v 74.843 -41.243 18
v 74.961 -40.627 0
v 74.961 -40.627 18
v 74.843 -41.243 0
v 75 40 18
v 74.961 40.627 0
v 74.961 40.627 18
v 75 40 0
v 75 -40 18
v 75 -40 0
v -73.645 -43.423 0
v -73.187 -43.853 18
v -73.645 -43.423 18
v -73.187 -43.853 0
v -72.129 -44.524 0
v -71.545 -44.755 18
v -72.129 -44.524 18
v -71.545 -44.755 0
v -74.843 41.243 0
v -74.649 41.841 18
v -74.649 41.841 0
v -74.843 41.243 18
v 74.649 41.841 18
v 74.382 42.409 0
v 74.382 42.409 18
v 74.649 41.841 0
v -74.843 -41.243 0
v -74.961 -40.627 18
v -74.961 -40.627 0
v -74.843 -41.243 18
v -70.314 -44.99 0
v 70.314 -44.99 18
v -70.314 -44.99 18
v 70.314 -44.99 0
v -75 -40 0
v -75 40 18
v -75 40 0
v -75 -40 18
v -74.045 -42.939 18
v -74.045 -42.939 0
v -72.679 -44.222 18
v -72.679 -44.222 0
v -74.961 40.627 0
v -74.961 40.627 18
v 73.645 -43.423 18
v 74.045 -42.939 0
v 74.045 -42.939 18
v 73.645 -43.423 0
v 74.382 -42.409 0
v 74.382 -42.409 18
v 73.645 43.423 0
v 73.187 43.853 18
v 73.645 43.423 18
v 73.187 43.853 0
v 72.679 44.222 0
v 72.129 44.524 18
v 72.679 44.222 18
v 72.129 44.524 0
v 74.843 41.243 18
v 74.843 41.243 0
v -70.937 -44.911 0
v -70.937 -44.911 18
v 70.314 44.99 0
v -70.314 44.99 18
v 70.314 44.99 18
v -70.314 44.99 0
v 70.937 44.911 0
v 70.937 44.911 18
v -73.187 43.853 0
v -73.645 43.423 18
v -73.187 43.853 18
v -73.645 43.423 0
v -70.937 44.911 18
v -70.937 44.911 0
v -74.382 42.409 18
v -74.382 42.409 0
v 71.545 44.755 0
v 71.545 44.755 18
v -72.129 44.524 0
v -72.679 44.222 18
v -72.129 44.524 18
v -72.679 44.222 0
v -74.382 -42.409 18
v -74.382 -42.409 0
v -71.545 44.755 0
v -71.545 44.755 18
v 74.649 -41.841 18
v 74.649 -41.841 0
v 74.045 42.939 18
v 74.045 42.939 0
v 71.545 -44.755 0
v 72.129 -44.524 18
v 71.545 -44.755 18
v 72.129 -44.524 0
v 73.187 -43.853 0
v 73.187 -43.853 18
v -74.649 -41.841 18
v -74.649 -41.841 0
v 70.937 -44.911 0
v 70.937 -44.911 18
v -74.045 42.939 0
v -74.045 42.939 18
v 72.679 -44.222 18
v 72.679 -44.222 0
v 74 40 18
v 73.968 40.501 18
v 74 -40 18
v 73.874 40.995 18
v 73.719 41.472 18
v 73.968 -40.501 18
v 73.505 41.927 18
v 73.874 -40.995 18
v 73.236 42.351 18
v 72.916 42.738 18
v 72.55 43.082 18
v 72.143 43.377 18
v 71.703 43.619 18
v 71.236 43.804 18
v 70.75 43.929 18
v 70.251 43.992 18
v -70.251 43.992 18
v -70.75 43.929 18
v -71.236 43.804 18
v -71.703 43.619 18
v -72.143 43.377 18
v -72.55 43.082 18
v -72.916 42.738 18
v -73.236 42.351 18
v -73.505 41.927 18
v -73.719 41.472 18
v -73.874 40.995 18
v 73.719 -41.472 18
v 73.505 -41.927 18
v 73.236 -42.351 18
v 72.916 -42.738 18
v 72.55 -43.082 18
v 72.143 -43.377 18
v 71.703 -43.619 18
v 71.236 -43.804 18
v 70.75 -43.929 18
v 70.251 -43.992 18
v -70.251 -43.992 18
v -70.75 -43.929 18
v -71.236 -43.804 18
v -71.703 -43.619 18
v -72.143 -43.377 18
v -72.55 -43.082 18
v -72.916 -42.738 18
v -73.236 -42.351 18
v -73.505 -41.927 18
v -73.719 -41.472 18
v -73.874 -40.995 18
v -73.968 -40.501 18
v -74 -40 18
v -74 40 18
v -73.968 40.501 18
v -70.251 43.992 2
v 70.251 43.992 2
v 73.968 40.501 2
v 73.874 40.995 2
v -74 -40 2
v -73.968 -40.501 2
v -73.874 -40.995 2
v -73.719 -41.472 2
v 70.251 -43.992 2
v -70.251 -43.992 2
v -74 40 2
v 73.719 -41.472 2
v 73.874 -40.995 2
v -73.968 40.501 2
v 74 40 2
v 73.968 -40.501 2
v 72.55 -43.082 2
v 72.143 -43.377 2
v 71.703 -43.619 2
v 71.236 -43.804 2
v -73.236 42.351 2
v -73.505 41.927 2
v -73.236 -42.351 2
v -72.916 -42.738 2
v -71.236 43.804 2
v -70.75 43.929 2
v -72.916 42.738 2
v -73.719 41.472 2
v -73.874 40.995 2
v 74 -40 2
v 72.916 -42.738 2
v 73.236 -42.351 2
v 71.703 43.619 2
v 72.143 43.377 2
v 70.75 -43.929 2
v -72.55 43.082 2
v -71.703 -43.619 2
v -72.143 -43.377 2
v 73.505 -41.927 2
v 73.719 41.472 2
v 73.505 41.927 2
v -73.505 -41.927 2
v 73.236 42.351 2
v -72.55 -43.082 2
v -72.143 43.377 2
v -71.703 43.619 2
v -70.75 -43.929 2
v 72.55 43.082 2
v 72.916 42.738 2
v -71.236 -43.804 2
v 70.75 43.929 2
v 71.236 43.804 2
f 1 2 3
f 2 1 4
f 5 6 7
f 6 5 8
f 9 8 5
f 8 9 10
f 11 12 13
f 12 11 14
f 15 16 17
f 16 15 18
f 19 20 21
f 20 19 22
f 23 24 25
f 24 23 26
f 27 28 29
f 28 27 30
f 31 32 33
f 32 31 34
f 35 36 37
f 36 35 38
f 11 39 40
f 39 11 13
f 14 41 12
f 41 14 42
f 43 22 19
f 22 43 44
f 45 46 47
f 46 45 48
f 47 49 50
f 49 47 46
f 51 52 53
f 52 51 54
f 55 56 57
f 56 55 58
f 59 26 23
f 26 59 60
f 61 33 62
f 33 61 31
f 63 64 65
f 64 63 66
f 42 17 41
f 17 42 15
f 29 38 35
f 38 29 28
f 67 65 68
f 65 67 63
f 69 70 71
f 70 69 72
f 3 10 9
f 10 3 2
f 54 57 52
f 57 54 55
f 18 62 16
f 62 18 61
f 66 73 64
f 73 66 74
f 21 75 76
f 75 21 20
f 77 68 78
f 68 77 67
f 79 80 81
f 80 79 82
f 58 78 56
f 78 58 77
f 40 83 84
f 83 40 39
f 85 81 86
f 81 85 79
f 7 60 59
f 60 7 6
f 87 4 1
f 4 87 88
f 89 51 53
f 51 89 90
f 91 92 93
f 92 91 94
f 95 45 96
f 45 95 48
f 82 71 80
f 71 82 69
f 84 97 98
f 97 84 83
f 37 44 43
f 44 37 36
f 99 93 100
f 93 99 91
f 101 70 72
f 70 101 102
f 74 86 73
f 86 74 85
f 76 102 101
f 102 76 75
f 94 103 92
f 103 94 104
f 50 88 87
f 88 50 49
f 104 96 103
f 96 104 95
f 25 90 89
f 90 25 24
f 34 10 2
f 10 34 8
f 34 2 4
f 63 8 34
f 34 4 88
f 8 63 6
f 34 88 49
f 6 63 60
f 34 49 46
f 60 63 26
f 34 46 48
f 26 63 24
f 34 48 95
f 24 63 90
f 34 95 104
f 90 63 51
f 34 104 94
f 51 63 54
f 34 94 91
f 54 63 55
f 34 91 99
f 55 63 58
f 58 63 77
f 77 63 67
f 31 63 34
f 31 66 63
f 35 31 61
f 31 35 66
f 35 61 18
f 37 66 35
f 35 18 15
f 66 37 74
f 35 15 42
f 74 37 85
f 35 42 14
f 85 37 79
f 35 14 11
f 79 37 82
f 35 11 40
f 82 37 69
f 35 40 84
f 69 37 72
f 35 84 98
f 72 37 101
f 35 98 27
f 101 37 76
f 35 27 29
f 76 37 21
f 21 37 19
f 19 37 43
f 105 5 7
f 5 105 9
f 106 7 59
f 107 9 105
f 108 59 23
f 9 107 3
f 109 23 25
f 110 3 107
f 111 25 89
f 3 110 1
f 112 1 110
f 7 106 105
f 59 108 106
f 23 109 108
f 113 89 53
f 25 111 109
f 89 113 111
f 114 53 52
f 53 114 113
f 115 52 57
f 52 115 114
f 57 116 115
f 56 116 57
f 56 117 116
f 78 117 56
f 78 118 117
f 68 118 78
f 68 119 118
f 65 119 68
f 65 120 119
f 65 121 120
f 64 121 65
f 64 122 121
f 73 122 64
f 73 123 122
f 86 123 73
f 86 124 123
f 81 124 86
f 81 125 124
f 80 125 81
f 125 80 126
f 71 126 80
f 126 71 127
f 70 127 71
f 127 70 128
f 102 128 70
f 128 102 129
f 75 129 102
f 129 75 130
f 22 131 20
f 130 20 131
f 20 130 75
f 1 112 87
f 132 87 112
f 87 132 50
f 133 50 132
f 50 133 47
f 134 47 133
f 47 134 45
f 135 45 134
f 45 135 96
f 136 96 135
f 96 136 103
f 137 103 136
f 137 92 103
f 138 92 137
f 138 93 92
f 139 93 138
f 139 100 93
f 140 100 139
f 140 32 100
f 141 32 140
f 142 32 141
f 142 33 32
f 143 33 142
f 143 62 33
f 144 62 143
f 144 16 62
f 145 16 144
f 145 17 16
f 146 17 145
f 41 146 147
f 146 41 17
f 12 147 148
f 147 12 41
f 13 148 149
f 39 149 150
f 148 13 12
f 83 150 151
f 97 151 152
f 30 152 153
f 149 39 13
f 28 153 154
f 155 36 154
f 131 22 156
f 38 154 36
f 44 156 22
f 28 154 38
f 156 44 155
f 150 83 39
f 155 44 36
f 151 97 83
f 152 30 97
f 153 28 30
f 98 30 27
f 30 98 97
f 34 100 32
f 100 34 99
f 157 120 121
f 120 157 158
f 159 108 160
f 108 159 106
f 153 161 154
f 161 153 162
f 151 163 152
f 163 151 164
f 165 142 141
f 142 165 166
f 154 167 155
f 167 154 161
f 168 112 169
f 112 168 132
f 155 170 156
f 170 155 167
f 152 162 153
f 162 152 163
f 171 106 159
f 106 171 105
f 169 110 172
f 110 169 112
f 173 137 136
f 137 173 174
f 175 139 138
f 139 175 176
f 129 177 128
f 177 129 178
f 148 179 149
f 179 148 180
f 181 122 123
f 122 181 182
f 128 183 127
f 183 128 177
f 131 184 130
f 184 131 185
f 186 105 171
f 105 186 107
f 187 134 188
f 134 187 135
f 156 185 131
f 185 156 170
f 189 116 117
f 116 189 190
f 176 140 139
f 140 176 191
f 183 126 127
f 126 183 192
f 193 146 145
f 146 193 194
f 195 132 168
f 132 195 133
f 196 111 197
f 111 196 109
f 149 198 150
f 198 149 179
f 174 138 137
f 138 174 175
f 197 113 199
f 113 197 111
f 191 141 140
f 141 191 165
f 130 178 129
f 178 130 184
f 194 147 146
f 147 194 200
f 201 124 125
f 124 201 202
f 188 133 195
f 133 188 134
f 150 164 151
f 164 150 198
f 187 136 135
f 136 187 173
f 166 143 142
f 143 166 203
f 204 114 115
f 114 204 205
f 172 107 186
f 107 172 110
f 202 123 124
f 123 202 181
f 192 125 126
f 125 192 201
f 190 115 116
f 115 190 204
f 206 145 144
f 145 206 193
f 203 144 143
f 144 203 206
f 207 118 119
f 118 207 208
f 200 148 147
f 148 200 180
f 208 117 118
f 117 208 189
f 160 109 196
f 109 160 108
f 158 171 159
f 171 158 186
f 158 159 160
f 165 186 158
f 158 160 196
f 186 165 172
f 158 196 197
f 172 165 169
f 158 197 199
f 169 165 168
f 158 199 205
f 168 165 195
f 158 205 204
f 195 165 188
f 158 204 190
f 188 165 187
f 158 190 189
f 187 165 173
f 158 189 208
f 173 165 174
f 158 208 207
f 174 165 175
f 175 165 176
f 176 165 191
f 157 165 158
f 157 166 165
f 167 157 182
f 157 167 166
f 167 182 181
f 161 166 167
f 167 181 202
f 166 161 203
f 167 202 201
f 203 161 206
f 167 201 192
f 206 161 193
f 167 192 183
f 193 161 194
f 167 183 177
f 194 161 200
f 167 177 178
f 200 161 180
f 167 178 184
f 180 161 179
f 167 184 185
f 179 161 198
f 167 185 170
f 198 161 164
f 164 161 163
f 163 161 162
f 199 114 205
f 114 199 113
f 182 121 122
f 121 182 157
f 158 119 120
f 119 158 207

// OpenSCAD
$fn = 50;


difference() {
	union() {
		hull() {
			translate(v = [-70.0000000000, 40.0000000000, 0]) {
				cylinder(h = 18, r = 5);
			}
			translate(v = [70.0000000000, 40.0000000000, 0]) {
				cylinder(h = 18, r = 5);
			}
			translate(v = [-70.0000000000, -40.0000000000, 0]) {
				cylinder(h = 18, r = 5);
			}
			translate(v = [70.0000000000, -40.0000000000, 0]) {
				cylinder(h = 18, r = 5);
			}
		}
	}
	union() {
		translate(v = [0, 0, 2]) {
			hull() {
				translate(v = [-70.0000000000, 40.0000000000, 0]) {
					cylinder(h = 16, r = 4);
				}
				translate(v = [70.0000000000, 40.0000000000, 0]) {
					cylinder(h = 16, r = 4);
				}
				translate(v = [-70.0000000000, -40.0000000000, 0]) {
					cylinder(h = 16, r = 4);
				}
				translate(v = [70.0000000000, -40.0000000000, 0]) {
					cylinder(h = 16, r = 4);
				}
			}
		}
	}
}
